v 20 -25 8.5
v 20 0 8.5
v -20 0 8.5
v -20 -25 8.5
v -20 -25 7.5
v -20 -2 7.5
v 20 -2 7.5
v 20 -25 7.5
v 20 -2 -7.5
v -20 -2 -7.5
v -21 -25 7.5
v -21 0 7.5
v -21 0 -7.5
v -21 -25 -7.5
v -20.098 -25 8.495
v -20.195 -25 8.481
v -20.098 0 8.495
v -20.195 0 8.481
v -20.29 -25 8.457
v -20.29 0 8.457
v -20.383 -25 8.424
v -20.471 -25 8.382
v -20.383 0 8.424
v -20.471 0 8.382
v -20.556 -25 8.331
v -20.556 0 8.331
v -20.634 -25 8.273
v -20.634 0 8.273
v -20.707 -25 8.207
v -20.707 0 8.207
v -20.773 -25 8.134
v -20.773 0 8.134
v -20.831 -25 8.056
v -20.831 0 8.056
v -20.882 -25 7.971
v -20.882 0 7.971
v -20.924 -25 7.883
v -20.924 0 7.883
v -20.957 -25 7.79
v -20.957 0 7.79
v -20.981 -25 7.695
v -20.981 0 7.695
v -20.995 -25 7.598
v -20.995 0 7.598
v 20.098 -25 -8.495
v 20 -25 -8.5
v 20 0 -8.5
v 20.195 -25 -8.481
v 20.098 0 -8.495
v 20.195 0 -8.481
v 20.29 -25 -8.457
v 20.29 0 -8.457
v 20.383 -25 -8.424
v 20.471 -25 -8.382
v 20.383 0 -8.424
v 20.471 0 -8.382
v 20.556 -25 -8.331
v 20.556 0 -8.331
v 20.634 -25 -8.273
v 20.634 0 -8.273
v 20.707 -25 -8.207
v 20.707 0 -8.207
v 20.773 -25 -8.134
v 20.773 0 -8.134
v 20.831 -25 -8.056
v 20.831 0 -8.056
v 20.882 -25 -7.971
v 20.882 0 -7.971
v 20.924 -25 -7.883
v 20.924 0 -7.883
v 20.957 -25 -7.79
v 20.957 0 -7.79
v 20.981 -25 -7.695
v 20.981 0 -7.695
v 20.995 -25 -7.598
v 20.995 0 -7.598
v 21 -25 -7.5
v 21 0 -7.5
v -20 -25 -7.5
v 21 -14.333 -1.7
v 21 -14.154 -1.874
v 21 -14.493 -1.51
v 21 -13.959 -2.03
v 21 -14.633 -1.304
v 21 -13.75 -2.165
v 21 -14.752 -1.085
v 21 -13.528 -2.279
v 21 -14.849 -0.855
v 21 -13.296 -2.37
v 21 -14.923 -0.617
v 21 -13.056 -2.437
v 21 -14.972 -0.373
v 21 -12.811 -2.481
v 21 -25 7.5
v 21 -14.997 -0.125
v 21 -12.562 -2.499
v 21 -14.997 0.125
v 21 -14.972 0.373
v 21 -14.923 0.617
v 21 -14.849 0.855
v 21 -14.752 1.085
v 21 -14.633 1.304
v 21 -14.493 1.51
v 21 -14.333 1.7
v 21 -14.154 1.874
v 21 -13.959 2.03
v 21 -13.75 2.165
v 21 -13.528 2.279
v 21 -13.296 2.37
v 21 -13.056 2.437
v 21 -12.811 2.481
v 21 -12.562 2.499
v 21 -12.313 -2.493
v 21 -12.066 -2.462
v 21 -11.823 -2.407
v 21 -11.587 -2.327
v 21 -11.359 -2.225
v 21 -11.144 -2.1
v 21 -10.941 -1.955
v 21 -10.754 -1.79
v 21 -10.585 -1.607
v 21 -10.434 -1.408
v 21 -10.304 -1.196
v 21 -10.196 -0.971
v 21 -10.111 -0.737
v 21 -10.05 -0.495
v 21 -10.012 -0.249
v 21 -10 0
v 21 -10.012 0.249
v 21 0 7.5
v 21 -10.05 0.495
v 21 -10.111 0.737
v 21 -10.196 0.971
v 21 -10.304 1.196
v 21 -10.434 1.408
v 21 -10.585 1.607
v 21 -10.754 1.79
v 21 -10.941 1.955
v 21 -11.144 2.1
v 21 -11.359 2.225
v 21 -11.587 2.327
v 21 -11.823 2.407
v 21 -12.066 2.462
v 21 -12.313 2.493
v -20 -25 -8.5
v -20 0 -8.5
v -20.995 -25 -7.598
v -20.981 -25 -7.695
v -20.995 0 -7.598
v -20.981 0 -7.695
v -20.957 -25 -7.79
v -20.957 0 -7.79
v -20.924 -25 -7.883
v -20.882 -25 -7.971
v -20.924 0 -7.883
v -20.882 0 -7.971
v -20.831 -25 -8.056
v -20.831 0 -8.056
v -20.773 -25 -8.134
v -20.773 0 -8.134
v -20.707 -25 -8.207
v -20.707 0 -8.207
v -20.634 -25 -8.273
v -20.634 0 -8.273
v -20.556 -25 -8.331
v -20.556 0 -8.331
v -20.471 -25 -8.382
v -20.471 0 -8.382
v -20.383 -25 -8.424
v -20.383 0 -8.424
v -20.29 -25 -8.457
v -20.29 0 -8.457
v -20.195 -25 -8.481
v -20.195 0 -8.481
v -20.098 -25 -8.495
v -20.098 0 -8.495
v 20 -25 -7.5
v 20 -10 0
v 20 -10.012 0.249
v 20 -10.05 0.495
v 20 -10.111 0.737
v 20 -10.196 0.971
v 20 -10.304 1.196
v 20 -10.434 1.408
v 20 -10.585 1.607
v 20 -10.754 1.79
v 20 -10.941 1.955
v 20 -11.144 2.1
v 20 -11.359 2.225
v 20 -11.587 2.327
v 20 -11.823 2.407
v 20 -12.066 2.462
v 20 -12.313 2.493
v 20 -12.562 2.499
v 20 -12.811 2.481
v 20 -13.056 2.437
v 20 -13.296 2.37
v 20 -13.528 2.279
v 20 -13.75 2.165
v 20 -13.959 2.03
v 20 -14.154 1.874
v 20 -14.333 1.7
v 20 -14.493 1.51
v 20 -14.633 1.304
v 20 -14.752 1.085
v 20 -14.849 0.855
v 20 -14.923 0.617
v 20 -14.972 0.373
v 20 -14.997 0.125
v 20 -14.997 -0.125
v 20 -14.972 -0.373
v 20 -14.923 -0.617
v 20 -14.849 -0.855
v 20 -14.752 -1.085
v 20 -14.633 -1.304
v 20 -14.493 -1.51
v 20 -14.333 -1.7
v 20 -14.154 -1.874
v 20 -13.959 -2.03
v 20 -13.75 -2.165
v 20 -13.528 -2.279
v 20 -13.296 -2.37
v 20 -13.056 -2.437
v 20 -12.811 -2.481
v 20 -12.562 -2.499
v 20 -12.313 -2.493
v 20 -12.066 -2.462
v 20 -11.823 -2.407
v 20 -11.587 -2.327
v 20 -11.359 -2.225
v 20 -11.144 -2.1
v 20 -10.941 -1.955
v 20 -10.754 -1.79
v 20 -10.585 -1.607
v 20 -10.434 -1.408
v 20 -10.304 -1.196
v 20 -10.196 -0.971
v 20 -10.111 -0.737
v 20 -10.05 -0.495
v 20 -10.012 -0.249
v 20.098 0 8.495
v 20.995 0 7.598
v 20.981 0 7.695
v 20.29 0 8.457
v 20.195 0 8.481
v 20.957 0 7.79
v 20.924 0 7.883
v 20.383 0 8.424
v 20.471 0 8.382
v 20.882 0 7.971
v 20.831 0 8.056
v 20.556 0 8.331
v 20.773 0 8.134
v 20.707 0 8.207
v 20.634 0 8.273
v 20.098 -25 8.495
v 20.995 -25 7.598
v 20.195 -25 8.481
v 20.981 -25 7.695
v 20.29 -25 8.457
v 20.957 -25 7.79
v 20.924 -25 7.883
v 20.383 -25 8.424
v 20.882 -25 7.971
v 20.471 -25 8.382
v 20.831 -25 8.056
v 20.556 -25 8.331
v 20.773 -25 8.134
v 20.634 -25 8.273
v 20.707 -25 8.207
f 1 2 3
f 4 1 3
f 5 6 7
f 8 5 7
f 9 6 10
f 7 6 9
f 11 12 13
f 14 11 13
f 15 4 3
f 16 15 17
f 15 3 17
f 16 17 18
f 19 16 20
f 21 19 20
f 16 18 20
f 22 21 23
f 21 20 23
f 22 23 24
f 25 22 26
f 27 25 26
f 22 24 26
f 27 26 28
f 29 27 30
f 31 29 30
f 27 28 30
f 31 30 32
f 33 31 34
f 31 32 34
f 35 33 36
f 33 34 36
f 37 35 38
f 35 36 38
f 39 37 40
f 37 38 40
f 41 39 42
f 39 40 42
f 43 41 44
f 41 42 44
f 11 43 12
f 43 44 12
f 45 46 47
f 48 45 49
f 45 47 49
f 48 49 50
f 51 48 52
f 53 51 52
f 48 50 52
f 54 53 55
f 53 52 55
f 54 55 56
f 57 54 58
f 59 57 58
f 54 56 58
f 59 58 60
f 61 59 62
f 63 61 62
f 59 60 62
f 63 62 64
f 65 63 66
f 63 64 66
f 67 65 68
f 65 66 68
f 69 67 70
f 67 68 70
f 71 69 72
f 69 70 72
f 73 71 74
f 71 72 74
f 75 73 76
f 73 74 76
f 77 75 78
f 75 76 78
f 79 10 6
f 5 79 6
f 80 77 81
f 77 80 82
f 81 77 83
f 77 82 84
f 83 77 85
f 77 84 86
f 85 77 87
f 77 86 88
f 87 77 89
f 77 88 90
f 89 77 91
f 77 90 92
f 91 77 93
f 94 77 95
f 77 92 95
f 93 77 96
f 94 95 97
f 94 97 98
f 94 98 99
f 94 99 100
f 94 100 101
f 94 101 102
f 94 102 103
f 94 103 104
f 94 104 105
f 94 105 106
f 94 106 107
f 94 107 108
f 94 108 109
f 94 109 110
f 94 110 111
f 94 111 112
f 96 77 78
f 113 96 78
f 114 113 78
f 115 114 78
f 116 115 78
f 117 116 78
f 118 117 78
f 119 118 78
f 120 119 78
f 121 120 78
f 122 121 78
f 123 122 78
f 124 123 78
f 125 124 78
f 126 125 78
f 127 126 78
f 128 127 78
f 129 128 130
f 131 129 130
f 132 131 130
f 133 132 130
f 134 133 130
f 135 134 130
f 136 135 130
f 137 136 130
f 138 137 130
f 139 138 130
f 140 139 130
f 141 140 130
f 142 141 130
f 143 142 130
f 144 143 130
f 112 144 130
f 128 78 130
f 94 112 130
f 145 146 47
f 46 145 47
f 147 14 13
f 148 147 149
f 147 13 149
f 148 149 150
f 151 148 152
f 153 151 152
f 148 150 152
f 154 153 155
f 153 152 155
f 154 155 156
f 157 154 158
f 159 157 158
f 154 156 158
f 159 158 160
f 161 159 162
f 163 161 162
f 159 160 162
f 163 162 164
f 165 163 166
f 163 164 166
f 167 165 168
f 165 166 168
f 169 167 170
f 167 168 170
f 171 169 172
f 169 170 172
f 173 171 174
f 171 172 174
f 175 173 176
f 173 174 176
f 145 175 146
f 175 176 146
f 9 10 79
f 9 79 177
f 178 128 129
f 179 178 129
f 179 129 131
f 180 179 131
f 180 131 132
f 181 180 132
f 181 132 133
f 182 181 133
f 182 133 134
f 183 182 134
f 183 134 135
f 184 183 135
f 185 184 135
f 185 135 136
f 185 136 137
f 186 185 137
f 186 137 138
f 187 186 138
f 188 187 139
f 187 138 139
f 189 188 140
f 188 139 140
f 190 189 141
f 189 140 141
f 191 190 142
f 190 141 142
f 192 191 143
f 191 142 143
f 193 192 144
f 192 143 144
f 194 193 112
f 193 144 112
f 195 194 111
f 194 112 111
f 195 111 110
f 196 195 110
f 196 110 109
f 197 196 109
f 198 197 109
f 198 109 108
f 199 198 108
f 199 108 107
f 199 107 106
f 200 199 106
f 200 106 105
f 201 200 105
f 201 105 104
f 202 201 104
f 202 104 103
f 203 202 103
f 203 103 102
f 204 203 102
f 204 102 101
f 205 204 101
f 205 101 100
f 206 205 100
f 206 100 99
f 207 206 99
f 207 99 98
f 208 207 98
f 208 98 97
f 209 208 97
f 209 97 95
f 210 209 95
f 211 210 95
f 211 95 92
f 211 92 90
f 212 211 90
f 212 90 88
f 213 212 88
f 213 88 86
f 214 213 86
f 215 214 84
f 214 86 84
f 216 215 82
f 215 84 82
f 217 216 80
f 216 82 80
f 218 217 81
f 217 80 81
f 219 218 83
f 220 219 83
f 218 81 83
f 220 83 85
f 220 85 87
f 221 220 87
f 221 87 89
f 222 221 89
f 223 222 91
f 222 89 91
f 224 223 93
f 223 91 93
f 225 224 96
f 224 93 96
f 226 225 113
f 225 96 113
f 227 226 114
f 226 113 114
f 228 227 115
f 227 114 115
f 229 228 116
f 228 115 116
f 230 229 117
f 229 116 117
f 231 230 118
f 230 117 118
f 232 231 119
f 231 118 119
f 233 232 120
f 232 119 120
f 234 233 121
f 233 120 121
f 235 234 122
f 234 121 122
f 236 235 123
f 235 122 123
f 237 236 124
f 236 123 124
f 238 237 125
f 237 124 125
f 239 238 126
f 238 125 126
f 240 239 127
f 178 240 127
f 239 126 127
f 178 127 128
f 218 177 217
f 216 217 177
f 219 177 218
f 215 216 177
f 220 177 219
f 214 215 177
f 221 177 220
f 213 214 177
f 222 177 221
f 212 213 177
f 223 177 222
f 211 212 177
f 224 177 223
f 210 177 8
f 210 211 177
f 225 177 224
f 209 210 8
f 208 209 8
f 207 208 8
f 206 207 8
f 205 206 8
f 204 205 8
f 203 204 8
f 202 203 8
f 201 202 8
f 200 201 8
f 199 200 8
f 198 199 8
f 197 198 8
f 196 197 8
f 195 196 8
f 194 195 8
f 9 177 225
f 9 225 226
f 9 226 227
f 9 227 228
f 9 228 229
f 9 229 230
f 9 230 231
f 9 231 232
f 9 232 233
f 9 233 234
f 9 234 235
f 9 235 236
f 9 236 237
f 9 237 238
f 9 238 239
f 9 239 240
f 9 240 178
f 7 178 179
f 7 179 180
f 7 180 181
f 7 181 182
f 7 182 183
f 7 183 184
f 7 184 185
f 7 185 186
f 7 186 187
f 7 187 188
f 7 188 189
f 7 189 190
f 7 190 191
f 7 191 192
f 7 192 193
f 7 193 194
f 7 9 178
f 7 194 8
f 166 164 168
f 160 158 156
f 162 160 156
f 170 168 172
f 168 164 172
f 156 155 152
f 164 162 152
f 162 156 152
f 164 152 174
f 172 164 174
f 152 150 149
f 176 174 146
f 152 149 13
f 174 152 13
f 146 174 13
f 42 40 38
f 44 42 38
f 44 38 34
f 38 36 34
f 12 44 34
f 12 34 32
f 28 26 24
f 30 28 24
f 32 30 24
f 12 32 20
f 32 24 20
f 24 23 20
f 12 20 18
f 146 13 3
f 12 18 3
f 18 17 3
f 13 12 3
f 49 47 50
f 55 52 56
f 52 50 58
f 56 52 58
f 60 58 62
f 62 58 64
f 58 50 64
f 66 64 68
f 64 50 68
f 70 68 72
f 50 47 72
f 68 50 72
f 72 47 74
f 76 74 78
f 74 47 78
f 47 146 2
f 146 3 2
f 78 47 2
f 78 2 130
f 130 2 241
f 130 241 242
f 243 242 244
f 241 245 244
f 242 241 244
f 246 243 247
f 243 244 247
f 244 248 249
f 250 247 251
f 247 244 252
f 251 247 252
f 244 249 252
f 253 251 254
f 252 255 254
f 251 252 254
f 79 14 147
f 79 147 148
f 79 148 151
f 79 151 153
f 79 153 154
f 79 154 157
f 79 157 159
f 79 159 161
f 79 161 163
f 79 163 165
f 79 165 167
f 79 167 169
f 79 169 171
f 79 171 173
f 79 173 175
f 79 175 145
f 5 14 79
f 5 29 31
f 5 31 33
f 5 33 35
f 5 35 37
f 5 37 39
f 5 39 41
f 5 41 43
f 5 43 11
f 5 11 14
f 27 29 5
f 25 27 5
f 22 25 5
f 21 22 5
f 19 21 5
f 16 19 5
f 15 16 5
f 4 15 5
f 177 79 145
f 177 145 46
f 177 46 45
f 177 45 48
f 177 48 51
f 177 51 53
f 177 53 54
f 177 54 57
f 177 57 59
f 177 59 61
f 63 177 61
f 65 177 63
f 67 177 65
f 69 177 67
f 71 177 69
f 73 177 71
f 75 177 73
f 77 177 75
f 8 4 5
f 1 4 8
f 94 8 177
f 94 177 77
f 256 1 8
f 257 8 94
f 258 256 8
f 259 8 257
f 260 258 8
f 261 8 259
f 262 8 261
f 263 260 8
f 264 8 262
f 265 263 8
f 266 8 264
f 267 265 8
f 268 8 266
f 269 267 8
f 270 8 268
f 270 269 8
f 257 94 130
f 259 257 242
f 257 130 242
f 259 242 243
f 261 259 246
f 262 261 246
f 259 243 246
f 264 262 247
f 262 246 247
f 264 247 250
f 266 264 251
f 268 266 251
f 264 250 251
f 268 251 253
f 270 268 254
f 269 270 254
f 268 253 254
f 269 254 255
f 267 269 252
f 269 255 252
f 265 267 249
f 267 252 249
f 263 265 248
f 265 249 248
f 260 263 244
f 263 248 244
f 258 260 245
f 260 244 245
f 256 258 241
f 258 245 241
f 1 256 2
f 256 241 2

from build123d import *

# Parameters (mm, degrees)
F0_W     = 40
F0_H     = 15
F1_DEPTH = 25
F2_DEPTH = 2
F3_R     = 2.5
F4_DEPTH = 5


with BuildPart() as f1:
    # F0 (on Front) → F1 (new body)
    with BuildSketch(Plane.XZ):
        with BuildLine():
            Line((-20, -8.5), (20, -8.5))
            ThreePointArc((20, -8.5), (20.707107, -8.207107), (21, -7.5))
            Line((21, -7.5), (21, 7.5))
            ThreePointArc((21, 7.5), (20.707107, 8.207107), (20, 8.5))
            Line((20, 8.5), (-20, 8.5))
            ThreePointArc((-20, 8.5), (-20.707107, 8.207107), (-21, 7.5))
            Line((-21, 7.5), (-21, -7.5))
            ThreePointArc((-21, -7.5), (-20.707107, -8.207107), (-20, -8.5))
        make_face()
        Rectangle(F0_W, F0_H, mode=Mode.SUBTRACT)
    extrude(amount=F1_DEPTH)

    # F0 (on Front) → F2 (join)
    with BuildSketch(Plane.XZ):
        Rectangle(F0_W, F0_H)
    extrude(amount=F2_DEPTH)

    # F3 (on face) → F4 (cut)
    with BuildSketch(Plane.YZ.offset(21)):
        with Locations((-12.5, 0)):
            Circle(F3_R)
    extrude(amount=-F4_DEPTH, mode=Mode.SUBTRACT)


solid = f1.part
